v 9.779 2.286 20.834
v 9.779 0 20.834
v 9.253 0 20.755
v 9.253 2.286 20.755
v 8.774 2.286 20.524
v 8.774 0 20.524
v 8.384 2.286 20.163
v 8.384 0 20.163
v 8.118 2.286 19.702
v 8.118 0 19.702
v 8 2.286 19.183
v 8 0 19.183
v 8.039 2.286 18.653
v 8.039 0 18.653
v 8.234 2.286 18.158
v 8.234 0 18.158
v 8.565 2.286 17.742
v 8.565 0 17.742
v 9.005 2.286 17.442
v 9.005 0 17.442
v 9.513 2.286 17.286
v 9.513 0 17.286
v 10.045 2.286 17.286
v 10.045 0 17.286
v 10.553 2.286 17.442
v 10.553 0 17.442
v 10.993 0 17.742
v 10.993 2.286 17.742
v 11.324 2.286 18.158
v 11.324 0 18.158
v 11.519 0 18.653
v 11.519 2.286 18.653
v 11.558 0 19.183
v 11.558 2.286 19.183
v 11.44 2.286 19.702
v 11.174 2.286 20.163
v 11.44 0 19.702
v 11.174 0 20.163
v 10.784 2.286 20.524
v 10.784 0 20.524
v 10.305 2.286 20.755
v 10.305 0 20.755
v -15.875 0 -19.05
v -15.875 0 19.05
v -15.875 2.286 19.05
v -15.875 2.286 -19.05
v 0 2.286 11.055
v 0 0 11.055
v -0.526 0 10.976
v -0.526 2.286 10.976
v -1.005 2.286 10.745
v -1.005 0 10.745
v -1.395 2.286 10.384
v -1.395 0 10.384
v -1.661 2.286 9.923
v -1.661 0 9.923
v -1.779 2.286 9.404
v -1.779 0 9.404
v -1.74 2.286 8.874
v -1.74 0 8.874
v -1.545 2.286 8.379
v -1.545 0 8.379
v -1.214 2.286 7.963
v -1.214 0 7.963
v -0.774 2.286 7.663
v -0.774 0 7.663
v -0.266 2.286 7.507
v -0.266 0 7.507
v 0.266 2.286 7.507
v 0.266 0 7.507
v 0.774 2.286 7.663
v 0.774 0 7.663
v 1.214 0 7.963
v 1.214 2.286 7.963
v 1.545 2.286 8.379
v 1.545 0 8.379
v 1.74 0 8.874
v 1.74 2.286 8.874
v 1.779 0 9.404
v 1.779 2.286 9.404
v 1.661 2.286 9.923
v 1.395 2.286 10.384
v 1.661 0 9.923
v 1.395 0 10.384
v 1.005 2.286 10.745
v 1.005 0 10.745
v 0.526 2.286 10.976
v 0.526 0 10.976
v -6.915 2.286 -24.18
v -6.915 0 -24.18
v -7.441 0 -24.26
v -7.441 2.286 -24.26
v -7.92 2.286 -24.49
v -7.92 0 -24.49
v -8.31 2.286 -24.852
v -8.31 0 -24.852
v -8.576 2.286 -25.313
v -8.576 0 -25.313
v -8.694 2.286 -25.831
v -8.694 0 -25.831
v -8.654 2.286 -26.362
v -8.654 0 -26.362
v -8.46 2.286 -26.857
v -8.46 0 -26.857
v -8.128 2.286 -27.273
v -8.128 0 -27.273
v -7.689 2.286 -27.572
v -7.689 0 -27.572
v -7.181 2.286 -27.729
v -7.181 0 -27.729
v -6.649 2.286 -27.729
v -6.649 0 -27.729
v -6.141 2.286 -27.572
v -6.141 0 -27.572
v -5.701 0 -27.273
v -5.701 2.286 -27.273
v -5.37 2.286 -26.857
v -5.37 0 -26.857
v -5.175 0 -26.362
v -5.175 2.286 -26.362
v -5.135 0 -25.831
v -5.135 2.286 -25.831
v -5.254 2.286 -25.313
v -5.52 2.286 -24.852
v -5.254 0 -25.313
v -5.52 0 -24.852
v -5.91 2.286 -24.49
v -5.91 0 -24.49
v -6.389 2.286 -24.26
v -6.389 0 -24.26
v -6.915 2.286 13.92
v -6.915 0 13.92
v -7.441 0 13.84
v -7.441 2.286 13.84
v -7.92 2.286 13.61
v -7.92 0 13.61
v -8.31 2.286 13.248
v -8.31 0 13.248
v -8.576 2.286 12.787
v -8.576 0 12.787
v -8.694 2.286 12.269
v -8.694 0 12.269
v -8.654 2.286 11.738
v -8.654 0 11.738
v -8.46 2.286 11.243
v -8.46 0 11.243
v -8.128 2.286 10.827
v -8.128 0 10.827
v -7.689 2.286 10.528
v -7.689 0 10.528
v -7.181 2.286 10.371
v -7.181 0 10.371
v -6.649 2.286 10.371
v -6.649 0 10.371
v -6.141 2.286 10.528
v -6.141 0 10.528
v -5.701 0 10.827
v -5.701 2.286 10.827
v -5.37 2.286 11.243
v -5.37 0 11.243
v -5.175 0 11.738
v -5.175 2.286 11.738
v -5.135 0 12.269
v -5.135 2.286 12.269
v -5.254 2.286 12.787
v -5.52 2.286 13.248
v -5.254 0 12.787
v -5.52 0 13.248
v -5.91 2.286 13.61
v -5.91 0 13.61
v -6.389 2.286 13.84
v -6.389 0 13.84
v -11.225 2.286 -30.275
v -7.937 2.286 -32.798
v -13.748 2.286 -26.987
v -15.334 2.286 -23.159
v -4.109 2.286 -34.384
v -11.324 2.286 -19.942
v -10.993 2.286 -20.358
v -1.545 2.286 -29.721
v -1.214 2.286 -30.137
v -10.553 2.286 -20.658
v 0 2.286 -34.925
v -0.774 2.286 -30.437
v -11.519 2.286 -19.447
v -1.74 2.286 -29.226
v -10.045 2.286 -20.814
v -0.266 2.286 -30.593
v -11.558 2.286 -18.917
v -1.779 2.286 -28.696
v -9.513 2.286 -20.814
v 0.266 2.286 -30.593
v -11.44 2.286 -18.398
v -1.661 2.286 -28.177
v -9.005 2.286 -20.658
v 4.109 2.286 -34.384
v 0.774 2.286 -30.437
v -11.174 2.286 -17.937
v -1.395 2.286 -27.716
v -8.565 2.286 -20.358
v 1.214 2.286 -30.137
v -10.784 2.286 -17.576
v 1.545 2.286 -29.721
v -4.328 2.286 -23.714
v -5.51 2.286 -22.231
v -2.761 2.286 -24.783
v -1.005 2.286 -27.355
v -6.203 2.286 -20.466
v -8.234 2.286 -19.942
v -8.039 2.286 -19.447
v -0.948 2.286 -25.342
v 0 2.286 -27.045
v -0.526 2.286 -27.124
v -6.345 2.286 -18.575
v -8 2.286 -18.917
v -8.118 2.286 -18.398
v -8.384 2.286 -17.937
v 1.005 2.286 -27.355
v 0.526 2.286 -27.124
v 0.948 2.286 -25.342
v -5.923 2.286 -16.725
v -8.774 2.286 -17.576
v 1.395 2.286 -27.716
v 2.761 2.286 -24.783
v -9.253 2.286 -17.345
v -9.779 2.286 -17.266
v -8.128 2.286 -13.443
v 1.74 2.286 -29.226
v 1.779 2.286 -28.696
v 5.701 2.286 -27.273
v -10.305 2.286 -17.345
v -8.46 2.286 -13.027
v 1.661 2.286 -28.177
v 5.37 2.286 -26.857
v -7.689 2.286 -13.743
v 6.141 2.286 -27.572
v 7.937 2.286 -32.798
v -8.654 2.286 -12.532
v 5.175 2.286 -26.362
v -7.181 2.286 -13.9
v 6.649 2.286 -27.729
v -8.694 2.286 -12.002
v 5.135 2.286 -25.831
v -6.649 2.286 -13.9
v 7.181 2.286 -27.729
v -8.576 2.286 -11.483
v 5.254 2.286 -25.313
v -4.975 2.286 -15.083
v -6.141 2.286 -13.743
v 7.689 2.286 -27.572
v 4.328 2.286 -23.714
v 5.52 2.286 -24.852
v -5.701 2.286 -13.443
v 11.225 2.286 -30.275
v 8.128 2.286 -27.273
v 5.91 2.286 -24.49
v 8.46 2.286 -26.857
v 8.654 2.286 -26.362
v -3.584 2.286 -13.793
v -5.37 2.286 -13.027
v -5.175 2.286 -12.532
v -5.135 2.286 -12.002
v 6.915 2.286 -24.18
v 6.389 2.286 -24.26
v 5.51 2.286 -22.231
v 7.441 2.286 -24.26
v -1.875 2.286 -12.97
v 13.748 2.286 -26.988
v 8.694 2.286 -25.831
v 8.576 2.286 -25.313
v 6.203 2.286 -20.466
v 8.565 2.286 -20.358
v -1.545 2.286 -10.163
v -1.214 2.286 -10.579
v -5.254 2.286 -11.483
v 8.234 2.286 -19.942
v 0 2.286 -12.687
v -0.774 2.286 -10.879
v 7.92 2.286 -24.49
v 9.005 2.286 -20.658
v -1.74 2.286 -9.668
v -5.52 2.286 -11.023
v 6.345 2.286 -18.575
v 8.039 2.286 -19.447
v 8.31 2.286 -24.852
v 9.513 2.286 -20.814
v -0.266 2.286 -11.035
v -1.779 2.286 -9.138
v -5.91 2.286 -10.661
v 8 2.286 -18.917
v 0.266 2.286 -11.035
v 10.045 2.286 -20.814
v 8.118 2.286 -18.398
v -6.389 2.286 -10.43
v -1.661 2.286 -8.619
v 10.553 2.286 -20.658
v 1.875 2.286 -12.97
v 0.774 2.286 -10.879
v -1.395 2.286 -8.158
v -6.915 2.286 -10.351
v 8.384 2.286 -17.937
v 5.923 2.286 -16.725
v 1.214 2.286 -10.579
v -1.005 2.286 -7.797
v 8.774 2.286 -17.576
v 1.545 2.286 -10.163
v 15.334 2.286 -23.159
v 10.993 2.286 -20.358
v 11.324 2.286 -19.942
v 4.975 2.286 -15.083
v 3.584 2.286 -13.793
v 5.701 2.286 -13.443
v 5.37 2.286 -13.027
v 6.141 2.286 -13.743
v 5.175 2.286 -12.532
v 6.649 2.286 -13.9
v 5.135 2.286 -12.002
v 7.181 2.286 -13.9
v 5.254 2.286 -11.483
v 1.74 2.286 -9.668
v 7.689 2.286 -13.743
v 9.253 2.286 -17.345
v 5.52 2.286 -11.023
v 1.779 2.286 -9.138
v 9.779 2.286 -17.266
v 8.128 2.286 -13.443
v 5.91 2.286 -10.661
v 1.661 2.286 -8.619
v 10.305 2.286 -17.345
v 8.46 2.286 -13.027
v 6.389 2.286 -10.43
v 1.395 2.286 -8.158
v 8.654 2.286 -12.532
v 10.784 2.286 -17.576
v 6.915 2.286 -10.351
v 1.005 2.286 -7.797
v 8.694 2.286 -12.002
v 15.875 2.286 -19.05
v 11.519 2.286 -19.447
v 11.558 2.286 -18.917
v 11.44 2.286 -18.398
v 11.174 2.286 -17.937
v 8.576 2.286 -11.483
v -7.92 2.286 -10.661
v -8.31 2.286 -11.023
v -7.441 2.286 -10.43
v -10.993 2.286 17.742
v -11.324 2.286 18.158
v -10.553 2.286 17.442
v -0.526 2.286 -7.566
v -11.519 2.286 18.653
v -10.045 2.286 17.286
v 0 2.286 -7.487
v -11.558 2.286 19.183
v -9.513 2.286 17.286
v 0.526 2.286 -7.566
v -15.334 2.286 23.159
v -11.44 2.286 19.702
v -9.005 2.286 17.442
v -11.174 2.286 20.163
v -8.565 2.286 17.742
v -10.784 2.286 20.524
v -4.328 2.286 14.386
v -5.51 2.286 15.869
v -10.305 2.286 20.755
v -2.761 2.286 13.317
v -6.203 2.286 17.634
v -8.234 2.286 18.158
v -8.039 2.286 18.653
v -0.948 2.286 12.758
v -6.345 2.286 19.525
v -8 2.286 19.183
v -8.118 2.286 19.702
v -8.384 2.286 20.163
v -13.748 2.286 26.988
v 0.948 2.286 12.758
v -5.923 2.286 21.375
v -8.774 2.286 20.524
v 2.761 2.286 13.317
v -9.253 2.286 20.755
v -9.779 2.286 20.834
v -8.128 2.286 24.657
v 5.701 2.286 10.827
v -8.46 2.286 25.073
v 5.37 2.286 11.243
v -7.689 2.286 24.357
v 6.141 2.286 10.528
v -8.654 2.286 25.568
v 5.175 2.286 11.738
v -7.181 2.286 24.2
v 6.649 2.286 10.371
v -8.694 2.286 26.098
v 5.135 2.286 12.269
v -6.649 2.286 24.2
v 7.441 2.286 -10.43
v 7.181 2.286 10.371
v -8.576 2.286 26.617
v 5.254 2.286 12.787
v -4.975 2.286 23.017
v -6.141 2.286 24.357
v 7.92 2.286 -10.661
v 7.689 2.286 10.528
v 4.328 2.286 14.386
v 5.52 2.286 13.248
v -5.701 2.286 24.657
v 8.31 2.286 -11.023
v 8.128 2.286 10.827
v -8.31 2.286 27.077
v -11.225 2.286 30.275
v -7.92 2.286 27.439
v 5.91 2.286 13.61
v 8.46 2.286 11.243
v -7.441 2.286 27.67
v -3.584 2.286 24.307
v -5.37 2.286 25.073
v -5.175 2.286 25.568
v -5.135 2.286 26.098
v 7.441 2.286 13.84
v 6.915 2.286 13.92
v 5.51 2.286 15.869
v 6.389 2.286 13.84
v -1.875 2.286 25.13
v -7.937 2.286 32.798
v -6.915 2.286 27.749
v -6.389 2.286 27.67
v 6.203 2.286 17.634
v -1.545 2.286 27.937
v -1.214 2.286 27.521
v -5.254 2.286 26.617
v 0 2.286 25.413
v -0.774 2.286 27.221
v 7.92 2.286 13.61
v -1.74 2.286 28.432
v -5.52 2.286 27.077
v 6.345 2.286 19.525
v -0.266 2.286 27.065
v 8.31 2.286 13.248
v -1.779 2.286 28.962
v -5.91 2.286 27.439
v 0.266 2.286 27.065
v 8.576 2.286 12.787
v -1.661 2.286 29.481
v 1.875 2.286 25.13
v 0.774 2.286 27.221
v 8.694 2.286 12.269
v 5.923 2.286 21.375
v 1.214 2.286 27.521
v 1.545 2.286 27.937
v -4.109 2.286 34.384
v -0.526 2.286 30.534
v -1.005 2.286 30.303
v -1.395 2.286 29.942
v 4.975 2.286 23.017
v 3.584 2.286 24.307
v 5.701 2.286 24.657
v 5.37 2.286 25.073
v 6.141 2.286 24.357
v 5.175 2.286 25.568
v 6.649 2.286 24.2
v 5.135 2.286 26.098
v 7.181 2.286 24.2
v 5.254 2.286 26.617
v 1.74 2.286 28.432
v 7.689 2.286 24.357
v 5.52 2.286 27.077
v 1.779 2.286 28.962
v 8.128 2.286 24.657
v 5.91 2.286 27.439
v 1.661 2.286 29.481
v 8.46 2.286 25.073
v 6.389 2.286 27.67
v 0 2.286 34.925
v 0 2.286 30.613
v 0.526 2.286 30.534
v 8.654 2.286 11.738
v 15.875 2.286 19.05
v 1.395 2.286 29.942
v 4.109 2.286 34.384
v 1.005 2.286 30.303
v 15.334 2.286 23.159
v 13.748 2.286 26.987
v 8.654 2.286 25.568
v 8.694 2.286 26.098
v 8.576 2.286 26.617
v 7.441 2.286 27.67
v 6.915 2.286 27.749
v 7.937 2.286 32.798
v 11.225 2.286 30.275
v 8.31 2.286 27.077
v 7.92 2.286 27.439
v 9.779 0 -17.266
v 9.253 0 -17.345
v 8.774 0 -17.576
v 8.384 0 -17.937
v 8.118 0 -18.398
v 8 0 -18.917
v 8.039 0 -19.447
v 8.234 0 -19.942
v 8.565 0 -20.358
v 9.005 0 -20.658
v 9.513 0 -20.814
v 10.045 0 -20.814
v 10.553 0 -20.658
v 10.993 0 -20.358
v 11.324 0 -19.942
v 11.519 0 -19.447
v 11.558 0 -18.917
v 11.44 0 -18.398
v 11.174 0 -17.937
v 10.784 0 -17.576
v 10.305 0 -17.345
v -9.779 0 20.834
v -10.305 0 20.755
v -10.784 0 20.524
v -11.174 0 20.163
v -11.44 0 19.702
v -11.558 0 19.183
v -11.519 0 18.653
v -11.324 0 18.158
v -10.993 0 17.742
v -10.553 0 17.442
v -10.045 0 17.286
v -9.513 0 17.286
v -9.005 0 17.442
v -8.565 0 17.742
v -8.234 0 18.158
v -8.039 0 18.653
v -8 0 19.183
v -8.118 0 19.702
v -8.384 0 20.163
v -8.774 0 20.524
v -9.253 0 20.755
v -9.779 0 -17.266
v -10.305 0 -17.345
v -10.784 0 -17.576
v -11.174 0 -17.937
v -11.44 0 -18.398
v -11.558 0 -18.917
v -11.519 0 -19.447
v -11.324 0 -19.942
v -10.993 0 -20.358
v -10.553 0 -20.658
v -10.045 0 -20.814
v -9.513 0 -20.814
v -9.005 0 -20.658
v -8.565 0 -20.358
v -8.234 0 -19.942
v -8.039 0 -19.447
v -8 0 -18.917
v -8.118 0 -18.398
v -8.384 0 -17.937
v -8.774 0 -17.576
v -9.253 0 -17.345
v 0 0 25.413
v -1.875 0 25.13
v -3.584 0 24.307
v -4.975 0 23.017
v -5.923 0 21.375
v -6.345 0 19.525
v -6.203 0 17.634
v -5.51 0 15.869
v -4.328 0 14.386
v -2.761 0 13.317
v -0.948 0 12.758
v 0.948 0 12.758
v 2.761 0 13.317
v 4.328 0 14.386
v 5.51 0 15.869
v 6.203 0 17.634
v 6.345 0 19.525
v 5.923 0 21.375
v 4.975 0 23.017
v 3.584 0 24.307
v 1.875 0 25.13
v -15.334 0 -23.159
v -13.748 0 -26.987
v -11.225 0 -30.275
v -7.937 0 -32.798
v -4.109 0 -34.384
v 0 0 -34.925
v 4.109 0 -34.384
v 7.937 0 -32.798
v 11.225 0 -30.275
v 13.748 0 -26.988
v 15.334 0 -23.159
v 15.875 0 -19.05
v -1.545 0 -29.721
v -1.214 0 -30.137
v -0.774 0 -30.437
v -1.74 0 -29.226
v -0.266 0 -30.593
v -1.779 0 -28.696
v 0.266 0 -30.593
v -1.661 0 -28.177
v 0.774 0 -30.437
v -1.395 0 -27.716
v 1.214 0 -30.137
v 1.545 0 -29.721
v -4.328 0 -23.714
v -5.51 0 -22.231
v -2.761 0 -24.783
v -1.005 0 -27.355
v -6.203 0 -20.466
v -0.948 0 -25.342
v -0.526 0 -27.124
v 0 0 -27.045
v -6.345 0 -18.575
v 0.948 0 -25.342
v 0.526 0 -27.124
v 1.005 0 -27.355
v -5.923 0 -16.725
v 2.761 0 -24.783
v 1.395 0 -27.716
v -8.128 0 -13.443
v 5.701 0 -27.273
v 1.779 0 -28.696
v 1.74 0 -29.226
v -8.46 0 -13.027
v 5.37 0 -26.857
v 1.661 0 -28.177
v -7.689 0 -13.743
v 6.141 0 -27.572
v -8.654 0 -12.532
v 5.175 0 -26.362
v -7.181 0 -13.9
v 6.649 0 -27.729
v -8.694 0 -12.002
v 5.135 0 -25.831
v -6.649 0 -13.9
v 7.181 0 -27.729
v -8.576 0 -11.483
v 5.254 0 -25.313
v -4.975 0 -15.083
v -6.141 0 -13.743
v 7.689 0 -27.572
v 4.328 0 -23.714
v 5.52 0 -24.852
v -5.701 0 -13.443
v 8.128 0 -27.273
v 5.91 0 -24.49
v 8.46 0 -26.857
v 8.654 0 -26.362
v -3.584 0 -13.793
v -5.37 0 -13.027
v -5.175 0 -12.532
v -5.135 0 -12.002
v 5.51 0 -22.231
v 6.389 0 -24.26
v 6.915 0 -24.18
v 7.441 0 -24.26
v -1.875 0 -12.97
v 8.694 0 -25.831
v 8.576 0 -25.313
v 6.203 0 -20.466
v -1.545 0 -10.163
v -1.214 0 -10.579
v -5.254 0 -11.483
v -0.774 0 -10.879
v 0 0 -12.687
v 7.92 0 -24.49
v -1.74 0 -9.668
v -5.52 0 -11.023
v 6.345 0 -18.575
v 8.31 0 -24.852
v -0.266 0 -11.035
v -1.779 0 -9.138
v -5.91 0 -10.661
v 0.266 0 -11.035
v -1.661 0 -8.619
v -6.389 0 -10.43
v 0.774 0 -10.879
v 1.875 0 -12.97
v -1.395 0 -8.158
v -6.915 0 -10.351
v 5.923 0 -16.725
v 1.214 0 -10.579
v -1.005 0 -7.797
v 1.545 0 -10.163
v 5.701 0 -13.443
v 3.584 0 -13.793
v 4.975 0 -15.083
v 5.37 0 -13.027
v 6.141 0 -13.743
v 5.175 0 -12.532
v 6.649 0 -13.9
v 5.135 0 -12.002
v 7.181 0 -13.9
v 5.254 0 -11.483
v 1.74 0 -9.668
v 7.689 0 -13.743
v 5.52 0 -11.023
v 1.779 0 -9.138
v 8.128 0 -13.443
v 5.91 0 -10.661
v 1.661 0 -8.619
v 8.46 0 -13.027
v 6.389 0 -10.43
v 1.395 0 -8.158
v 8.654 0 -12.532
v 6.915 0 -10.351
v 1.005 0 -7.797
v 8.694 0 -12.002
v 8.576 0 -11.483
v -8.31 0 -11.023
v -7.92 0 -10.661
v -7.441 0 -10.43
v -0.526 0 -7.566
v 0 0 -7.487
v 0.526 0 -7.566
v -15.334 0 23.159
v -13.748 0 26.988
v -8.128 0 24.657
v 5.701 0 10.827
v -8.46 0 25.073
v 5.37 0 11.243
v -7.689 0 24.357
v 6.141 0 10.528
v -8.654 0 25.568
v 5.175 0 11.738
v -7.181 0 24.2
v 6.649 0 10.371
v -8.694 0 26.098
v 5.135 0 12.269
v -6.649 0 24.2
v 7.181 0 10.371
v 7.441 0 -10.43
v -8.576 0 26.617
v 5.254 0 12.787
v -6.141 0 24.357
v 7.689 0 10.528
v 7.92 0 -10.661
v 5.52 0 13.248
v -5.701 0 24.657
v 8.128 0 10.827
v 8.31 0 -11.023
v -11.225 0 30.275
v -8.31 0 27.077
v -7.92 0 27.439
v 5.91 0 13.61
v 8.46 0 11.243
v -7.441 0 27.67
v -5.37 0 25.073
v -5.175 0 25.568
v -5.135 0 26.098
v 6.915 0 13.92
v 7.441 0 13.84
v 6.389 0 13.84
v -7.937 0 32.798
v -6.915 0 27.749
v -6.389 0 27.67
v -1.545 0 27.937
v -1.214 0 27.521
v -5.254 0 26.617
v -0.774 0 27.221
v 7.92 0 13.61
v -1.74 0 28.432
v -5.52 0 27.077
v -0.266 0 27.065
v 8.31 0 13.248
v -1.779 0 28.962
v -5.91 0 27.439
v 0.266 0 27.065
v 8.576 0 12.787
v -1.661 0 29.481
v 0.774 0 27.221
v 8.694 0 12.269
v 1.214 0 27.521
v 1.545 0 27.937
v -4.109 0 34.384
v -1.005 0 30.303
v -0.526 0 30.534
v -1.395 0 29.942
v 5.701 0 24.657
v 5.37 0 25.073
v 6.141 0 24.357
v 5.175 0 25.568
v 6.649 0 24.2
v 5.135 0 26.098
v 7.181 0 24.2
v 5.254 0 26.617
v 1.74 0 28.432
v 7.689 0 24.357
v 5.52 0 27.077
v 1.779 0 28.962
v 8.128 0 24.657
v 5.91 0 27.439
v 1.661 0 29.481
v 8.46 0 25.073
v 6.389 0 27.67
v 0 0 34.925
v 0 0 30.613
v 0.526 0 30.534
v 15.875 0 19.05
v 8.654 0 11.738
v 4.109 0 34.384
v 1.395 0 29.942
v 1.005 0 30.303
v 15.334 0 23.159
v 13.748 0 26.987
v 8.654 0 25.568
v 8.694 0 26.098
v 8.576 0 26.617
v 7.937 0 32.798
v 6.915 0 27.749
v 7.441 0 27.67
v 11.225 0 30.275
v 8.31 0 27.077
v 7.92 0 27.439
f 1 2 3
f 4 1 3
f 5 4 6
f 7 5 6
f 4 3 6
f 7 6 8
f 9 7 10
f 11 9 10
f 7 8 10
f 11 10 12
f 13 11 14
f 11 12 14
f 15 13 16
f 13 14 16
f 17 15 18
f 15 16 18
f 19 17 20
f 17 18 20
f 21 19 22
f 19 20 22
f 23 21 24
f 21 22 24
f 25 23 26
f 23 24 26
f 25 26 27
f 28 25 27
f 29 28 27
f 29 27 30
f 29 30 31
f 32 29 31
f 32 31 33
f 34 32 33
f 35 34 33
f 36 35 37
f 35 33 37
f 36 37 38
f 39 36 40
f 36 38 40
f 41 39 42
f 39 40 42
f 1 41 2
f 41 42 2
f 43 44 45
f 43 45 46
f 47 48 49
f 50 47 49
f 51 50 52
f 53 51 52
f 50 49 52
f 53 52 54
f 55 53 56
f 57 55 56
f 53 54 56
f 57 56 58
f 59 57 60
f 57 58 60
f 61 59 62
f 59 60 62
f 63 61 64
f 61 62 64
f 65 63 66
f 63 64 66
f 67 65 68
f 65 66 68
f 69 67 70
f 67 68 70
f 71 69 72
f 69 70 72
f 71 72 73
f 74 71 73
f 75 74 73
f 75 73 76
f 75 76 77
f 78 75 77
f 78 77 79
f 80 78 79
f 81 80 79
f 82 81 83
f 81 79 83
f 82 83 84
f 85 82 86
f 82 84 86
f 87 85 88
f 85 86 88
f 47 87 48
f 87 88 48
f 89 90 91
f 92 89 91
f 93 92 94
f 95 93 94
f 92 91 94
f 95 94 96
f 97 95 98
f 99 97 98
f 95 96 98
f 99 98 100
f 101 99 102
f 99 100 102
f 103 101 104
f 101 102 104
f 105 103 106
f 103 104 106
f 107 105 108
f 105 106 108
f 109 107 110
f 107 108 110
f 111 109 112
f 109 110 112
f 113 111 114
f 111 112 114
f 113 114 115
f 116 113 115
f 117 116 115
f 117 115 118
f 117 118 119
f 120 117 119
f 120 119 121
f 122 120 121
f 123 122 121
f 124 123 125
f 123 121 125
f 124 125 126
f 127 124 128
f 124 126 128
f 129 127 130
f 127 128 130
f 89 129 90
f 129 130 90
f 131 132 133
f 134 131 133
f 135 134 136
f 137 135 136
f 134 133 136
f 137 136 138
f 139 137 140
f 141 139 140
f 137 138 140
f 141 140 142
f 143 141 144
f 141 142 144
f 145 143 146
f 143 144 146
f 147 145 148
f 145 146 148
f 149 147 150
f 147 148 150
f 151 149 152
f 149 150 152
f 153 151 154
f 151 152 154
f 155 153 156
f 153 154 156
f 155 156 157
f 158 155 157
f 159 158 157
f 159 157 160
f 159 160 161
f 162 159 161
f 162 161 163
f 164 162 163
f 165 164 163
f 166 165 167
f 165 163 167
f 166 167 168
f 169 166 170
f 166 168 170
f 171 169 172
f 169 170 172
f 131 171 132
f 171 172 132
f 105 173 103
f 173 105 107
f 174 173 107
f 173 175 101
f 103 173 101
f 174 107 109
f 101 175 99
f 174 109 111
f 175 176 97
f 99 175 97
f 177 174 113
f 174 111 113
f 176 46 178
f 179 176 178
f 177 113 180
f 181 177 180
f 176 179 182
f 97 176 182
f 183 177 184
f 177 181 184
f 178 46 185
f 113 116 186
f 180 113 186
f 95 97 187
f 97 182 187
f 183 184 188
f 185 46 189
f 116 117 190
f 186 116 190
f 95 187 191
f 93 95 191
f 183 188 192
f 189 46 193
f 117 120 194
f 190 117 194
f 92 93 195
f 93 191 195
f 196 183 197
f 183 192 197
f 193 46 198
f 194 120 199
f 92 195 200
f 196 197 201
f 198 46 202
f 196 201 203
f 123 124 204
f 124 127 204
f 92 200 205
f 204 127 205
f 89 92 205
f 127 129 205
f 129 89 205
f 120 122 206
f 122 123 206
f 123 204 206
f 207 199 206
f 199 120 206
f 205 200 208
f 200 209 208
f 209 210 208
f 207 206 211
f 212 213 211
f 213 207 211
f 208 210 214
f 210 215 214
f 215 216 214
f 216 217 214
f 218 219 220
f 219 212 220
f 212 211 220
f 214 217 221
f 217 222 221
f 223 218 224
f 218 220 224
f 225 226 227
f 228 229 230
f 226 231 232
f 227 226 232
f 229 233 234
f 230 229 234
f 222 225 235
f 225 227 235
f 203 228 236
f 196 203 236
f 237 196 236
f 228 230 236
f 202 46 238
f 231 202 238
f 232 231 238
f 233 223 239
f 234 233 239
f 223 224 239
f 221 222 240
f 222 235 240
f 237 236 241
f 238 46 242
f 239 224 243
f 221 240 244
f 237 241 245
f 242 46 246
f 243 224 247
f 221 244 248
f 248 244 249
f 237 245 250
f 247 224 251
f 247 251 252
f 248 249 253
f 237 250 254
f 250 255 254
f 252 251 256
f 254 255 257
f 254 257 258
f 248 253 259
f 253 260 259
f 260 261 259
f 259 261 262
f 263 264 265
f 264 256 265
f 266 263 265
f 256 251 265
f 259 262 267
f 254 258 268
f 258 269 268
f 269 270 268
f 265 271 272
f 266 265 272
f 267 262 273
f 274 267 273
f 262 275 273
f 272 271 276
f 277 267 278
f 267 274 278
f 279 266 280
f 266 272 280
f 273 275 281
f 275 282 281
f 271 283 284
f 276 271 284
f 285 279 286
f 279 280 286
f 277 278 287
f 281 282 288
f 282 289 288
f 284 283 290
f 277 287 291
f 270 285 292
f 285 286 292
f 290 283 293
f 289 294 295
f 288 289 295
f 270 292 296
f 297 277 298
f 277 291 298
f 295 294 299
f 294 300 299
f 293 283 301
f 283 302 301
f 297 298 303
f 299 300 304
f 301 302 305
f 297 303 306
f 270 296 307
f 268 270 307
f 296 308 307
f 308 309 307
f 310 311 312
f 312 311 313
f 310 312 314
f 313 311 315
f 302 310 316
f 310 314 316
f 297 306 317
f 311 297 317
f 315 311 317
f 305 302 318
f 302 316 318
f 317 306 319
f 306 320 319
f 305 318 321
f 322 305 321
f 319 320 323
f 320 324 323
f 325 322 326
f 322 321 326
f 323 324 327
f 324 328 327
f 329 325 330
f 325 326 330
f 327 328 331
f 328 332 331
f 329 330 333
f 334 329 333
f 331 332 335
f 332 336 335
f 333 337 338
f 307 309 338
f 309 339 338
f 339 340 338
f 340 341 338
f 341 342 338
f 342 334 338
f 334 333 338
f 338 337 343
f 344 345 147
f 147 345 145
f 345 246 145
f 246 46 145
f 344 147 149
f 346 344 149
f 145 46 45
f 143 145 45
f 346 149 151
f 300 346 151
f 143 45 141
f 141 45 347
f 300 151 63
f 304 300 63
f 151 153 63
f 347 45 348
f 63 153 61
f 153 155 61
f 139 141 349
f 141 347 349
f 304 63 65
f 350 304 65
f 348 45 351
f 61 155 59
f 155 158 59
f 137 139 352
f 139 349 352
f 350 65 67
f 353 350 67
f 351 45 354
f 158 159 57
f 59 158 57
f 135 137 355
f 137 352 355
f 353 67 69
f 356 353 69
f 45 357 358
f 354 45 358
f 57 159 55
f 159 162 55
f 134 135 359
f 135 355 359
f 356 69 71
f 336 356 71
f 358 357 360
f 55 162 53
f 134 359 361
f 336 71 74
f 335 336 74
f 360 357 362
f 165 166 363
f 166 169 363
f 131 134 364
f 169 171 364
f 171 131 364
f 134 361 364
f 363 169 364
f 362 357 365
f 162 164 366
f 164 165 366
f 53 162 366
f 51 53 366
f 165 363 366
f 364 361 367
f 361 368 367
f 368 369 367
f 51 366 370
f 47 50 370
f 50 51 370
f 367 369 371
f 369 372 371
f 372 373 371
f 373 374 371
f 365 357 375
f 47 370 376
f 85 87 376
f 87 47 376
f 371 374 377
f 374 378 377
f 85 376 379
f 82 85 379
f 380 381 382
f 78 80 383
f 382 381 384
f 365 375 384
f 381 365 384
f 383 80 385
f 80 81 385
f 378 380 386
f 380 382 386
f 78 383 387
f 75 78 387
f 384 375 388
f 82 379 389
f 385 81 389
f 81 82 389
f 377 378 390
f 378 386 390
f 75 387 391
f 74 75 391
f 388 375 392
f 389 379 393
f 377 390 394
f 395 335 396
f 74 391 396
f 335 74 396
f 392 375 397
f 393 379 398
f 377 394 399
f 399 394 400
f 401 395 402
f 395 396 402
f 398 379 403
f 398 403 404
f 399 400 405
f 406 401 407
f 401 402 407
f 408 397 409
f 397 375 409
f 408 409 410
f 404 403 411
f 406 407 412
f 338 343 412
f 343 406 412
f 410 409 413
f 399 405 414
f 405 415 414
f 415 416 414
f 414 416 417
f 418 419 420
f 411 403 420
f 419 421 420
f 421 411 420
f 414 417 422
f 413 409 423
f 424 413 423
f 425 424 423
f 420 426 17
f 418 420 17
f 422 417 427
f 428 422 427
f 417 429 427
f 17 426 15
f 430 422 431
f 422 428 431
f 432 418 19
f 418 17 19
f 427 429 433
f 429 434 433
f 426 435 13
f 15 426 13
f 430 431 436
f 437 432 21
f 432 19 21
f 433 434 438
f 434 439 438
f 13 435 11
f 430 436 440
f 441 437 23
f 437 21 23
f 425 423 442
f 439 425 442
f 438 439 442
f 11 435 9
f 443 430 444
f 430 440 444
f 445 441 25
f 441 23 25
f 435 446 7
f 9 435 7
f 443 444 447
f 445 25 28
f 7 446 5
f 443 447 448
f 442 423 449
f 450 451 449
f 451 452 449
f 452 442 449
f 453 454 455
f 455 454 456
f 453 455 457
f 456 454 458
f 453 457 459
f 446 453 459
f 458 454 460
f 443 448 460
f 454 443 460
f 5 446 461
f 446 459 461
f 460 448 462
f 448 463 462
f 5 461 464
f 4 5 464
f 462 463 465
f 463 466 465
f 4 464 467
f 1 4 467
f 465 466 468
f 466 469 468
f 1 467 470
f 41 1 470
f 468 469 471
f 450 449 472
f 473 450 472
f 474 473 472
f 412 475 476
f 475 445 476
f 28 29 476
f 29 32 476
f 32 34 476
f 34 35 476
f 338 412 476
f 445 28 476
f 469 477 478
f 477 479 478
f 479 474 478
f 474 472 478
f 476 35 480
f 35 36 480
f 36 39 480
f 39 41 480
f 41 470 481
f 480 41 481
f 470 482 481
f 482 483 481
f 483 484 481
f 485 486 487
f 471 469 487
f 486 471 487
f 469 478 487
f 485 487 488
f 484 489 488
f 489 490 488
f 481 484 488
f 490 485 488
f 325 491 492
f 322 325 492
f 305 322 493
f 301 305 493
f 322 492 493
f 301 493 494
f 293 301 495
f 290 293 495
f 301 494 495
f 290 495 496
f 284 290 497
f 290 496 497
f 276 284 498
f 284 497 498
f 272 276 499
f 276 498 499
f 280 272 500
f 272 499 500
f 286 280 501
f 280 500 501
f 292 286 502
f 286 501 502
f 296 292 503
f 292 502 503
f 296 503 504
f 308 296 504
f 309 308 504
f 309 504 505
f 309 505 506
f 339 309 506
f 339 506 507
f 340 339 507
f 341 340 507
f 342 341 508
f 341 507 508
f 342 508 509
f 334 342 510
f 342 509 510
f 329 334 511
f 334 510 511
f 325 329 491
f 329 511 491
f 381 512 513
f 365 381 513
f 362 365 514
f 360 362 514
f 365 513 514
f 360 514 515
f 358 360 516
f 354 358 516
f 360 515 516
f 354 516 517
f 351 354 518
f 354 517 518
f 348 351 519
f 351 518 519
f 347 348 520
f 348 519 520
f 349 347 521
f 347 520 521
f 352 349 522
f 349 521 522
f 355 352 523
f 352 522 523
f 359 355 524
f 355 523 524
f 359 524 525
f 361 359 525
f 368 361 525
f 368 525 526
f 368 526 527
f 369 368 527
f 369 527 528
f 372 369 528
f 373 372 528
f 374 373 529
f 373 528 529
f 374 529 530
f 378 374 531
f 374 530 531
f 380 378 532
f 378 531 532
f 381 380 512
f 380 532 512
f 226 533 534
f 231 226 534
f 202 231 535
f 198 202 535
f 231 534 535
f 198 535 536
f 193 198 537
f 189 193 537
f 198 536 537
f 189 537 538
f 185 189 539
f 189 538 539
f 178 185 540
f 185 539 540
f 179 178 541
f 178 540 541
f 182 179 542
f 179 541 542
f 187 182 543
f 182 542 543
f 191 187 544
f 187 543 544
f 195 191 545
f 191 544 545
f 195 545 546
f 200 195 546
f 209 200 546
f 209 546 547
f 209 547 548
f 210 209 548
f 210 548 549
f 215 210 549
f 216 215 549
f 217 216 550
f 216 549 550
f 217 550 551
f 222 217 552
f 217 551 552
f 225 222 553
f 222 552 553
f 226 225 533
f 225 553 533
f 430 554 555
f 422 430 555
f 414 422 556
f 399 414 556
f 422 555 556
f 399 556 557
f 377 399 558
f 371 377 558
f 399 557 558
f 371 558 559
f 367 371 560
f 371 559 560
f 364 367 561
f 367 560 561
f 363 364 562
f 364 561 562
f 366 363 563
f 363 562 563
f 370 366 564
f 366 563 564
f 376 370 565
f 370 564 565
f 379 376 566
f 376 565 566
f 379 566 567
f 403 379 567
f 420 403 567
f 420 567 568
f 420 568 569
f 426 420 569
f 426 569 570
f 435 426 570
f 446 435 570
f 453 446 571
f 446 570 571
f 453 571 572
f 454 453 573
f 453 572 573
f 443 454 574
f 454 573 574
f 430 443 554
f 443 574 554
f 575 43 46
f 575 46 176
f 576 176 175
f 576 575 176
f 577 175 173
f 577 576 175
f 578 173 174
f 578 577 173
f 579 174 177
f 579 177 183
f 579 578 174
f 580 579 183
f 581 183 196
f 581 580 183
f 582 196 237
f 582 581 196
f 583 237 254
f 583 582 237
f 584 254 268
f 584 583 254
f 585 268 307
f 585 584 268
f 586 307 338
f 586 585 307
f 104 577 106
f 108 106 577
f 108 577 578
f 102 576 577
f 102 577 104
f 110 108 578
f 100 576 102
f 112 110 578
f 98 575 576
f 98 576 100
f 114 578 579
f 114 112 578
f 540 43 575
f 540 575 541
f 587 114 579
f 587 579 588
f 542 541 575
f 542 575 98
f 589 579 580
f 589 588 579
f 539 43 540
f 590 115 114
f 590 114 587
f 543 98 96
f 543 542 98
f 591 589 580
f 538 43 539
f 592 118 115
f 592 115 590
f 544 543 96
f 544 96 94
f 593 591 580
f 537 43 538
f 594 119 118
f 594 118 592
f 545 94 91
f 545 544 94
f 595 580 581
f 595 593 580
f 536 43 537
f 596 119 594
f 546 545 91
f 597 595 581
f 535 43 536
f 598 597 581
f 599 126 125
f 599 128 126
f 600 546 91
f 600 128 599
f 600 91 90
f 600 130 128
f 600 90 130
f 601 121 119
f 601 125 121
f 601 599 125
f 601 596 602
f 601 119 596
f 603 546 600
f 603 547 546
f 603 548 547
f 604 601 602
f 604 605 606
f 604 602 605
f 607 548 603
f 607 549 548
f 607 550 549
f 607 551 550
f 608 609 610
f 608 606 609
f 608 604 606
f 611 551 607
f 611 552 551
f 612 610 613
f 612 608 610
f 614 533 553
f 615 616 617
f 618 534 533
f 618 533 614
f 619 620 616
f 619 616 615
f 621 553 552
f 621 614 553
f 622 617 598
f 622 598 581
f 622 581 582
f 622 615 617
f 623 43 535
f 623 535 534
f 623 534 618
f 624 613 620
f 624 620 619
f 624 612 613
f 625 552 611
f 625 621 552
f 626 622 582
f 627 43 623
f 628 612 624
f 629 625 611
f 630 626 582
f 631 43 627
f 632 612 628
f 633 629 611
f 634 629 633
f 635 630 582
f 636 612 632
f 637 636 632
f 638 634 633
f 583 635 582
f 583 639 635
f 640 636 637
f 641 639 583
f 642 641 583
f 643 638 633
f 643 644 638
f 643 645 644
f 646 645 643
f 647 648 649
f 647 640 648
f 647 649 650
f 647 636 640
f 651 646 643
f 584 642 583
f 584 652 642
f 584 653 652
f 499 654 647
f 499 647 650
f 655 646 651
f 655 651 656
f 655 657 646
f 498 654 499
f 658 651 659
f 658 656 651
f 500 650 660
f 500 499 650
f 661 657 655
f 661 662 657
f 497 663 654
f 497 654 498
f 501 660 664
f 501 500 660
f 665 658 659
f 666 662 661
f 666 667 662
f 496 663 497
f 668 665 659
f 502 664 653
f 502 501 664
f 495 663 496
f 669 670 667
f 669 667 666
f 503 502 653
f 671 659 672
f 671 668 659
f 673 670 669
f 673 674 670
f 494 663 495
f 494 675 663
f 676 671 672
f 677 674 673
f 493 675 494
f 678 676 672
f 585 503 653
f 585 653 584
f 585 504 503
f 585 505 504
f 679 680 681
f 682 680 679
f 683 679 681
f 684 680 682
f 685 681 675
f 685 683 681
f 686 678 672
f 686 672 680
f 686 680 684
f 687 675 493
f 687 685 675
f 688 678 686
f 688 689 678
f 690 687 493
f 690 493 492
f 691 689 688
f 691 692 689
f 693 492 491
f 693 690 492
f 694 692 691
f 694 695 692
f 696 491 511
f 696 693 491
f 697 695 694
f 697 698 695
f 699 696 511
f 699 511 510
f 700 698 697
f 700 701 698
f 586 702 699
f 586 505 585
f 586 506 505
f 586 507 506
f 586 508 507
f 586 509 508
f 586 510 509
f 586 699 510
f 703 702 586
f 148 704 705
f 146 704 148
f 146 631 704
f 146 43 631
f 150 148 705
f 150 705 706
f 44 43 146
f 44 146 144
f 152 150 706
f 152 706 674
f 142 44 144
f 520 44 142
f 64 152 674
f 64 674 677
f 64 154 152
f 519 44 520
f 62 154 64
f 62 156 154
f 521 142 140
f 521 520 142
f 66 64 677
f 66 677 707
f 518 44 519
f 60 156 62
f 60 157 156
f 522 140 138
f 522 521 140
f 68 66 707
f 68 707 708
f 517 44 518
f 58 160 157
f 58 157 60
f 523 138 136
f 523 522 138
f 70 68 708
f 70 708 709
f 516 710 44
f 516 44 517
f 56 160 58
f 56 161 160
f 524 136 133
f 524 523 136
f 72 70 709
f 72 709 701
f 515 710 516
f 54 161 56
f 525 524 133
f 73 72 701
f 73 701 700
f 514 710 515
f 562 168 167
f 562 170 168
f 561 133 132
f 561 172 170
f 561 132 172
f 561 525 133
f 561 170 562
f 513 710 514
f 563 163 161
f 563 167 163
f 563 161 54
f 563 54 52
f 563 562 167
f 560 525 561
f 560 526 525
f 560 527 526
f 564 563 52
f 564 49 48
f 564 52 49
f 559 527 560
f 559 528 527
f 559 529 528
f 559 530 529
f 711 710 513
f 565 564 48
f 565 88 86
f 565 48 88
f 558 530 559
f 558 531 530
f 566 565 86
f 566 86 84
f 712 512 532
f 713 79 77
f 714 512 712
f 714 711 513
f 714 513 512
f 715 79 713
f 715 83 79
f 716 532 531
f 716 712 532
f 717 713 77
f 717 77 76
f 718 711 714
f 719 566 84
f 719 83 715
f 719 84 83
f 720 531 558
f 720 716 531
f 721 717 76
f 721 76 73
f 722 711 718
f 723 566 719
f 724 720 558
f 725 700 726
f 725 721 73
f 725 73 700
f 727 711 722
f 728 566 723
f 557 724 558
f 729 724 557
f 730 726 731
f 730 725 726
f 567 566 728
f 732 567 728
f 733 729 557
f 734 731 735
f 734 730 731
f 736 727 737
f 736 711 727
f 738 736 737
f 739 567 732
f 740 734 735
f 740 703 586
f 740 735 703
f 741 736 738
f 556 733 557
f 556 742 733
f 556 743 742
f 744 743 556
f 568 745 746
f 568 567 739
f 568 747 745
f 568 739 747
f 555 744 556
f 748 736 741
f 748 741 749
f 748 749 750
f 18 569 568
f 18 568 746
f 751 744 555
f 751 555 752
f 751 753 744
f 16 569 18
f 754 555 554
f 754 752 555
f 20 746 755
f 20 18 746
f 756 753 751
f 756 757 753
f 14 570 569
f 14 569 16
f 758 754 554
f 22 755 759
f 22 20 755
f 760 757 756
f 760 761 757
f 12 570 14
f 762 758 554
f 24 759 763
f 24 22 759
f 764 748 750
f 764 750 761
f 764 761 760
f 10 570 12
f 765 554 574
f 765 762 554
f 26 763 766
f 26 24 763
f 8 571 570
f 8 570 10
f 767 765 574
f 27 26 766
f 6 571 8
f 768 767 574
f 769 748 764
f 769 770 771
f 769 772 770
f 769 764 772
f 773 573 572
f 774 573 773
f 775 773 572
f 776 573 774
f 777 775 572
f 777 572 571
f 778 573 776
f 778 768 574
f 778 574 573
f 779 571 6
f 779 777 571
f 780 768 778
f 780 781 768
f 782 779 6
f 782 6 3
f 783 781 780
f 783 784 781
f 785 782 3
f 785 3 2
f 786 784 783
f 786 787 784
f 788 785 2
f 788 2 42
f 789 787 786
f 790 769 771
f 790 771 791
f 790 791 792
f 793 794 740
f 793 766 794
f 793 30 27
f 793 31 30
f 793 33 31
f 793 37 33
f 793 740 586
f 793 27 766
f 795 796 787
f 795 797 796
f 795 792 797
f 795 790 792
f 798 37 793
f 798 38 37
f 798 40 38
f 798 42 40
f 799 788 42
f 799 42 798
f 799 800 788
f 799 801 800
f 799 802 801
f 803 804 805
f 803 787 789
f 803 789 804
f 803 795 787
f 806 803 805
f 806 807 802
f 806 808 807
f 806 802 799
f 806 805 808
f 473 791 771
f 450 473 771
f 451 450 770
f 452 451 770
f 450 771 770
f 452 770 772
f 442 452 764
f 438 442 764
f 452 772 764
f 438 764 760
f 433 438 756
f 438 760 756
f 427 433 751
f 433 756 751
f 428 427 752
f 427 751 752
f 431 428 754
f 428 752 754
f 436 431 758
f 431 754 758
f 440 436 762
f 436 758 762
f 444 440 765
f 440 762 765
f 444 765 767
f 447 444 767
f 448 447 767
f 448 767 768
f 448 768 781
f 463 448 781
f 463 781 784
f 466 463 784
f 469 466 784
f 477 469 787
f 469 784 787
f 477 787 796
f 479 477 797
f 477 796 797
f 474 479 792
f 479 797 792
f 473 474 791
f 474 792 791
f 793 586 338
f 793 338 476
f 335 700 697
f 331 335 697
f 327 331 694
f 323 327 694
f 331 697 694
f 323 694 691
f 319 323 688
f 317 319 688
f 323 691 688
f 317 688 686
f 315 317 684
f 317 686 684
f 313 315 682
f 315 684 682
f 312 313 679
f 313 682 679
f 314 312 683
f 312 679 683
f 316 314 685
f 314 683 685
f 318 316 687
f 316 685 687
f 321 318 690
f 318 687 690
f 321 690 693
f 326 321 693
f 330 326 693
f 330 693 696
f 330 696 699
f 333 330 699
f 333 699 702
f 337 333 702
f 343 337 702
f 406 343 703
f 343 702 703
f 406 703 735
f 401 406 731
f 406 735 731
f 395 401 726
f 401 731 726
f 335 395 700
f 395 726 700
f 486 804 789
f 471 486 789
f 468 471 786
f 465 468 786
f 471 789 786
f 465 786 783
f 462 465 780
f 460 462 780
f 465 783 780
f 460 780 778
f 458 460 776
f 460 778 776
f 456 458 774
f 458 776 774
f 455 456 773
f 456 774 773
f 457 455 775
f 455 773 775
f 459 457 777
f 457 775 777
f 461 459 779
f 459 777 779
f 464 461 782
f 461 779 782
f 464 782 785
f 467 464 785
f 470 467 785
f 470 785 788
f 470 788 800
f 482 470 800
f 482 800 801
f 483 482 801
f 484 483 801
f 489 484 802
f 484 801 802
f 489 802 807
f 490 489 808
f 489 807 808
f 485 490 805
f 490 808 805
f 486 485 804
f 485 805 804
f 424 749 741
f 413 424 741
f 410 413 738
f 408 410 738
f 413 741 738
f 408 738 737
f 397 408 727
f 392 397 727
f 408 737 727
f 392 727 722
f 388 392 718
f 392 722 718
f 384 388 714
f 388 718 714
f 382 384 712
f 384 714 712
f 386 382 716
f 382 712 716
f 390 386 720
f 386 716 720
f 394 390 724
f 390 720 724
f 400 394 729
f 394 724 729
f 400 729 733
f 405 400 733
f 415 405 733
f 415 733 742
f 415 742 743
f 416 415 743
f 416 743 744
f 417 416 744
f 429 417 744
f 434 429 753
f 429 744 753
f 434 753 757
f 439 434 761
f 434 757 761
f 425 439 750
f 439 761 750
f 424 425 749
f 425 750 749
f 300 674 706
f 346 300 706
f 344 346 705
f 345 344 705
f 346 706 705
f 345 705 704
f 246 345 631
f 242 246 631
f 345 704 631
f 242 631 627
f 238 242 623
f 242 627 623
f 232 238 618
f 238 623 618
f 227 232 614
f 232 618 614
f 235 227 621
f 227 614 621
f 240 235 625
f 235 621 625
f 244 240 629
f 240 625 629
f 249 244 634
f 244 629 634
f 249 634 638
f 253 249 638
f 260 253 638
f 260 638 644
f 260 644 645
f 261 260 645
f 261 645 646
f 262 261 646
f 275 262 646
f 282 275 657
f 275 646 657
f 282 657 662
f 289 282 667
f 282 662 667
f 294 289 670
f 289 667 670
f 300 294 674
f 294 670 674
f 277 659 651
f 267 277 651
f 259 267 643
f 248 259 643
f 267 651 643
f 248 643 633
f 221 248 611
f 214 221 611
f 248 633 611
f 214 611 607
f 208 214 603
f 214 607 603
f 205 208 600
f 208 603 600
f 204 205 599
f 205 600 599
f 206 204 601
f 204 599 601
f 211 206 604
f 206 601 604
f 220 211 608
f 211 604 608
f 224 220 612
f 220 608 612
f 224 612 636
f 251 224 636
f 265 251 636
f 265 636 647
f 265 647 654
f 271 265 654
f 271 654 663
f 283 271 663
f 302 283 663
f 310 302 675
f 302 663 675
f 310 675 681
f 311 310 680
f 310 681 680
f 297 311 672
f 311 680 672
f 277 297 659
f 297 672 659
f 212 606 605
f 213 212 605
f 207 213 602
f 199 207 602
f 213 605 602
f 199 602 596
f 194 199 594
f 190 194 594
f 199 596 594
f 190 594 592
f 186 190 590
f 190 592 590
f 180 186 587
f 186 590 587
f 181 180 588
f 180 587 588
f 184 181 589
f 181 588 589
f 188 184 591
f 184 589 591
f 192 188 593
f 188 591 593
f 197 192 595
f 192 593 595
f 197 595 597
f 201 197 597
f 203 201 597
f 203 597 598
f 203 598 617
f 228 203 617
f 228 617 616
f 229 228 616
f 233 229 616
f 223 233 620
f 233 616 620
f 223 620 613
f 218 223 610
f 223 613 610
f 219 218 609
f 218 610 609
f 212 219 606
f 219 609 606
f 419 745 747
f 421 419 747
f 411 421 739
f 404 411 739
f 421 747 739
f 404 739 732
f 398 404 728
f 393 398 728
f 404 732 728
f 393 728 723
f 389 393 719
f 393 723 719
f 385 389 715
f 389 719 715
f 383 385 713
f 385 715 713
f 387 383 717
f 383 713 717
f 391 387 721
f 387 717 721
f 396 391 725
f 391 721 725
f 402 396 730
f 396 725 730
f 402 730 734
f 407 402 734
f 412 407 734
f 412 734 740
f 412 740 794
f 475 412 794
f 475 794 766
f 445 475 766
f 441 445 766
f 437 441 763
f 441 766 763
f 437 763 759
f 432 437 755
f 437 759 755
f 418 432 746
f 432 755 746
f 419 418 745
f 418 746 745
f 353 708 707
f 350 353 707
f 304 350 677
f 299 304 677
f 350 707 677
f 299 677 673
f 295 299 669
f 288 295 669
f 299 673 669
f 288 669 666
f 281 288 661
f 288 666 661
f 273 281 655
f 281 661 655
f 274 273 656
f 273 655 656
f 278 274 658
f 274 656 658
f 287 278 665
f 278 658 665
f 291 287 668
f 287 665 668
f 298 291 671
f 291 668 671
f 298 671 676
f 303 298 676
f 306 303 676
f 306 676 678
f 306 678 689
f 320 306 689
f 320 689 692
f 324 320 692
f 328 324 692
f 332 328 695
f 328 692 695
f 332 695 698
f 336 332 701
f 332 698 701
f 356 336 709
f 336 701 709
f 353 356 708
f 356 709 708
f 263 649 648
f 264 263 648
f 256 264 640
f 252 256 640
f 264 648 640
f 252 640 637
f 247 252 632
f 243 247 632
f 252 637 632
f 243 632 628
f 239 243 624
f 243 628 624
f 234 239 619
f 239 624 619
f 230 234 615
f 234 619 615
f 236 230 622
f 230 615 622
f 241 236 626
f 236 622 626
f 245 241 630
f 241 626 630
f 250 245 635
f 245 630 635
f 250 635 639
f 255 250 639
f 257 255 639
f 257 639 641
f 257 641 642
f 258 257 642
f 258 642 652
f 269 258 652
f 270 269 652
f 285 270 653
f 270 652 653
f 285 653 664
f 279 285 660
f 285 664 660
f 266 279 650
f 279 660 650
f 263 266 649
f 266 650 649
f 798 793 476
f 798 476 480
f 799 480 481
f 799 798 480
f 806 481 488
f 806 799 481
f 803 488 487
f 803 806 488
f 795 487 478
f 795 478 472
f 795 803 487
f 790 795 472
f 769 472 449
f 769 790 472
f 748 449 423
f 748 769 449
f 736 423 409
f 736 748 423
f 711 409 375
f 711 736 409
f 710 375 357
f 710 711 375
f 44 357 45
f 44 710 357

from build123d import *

# Parameters (mm, degrees)
SKETCH1_R           = 6.3627
SKETCH1_R_2         = 1.78435
BOSS_EXTRUDE1_DEPTH = 2.286


with BuildPart() as part:
    # Sketch1 → Boss-Extrude1 (new body)
    with BuildSketch(Plane.XZ):
        with BuildLine():
            Line((15.875, -19.05), (15.875, 19.05))
            ThreePointArc((15.875, 19.05), (0, 34.925), (-15.875, 19.05))
            Line((-15.875, 19.05), (-15.875, -19.05))
            ThreePointArc((-15.875, -19.05), (0, -34.925), (15.875, -19.05))
        make_face()
        with Locations(Location((0, -19.05, 0), (0, 0, 90))):
            Circle(SKETCH1_R, mode=Mode.SUBTRACT)
        with Locations(Location((0, 19.05, 0), (0, 0, 90))):
            Circle(SKETCH1_R, mode=Mode.SUBTRACT)
        with Locations(Location((9.779, 19.05, 0), (0, 0, 90))):
            Circle(SKETCH1_R_2, mode=Mode.SUBTRACT)
        with Locations(Location((6.914797213, 12.135202787, 0), (0, 0, 90))):
            Circle(SKETCH1_R_2, mode=Mode.SUBTRACT)
        with Locations(Location((0, 9.271, 0), (0, 0, 90))):
            Circle(SKETCH1_R_2, mode=Mode.SUBTRACT)
        with Locations(Location((-6.914797213, 12.135202787, 0), (0, 0, 90))):
            Circle(SKETCH1_R_2, mode=Mode.SUBTRACT)
        with Locations(Location((-9.779, 19.05, 0), (0, 0, 90))):
            Circle(SKETCH1_R_2, mode=Mode.SUBTRACT)
        with Locations(Location((-6.914797213, 25.964797213, 0), (0, 0, 90))):
            Circle(SKETCH1_R_2, mode=Mode.SUBTRACT)
        with Locations(Location((0, 28.829, 0), (0, 0, 90))):
            Circle(SKETCH1_R_2, mode=Mode.SUBTRACT)
        with Locations(Location((6.914797213, 25.964797213, 0), (0, 0, 90))):
            Circle(SKETCH1_R_2, mode=Mode.SUBTRACT)
        with Locations(Location((9.779, -19.05, 0), (0, 0, 90))):
            Circle(SKETCH1_R_2, mode=Mode.SUBTRACT)
        with Locations(Location((6.914797213, -12.135202787, 0), (0, 0, 90))):
            Circle(SKETCH1_R_2, mode=Mode.SUBTRACT)
        with Locations(Location((0, -9.271, 0), (0, 0, 90))):
            Circle(SKETCH1_R_2, mode=Mode.SUBTRACT)
        with Locations(Location((-6.914797213, -12.135202787, 0), (0, 0, 90))):
            Circle(SKETCH1_R_2, mode=Mode.SUBTRACT)
        with Locations(Location((-9.779, -19.05, 0), (0, 0, 90))):
            Circle(SKETCH1_R_2, mode=Mode.SUBTRACT)
        with Locations(Location((-6.914797213, -25.964797213, 0), (0, 0, 90))):
            Circle(SKETCH1_R_2, mode=Mode.SUBTRACT)
        with Locations(Location((0, -28.829, 0), (0, 0, 90))):
            Circle(SKETCH1_R_2, mode=Mode.SUBTRACT)
        with Locations(Location((6.914797213, -25.964797213, 0), (0, 0, 90))):
            Circle(SKETCH1_R_2, mode=Mode.SUBTRACT)
    extrude(amount=-BOSS_EXTRUDE1_DEPTH)


solid = part.part
